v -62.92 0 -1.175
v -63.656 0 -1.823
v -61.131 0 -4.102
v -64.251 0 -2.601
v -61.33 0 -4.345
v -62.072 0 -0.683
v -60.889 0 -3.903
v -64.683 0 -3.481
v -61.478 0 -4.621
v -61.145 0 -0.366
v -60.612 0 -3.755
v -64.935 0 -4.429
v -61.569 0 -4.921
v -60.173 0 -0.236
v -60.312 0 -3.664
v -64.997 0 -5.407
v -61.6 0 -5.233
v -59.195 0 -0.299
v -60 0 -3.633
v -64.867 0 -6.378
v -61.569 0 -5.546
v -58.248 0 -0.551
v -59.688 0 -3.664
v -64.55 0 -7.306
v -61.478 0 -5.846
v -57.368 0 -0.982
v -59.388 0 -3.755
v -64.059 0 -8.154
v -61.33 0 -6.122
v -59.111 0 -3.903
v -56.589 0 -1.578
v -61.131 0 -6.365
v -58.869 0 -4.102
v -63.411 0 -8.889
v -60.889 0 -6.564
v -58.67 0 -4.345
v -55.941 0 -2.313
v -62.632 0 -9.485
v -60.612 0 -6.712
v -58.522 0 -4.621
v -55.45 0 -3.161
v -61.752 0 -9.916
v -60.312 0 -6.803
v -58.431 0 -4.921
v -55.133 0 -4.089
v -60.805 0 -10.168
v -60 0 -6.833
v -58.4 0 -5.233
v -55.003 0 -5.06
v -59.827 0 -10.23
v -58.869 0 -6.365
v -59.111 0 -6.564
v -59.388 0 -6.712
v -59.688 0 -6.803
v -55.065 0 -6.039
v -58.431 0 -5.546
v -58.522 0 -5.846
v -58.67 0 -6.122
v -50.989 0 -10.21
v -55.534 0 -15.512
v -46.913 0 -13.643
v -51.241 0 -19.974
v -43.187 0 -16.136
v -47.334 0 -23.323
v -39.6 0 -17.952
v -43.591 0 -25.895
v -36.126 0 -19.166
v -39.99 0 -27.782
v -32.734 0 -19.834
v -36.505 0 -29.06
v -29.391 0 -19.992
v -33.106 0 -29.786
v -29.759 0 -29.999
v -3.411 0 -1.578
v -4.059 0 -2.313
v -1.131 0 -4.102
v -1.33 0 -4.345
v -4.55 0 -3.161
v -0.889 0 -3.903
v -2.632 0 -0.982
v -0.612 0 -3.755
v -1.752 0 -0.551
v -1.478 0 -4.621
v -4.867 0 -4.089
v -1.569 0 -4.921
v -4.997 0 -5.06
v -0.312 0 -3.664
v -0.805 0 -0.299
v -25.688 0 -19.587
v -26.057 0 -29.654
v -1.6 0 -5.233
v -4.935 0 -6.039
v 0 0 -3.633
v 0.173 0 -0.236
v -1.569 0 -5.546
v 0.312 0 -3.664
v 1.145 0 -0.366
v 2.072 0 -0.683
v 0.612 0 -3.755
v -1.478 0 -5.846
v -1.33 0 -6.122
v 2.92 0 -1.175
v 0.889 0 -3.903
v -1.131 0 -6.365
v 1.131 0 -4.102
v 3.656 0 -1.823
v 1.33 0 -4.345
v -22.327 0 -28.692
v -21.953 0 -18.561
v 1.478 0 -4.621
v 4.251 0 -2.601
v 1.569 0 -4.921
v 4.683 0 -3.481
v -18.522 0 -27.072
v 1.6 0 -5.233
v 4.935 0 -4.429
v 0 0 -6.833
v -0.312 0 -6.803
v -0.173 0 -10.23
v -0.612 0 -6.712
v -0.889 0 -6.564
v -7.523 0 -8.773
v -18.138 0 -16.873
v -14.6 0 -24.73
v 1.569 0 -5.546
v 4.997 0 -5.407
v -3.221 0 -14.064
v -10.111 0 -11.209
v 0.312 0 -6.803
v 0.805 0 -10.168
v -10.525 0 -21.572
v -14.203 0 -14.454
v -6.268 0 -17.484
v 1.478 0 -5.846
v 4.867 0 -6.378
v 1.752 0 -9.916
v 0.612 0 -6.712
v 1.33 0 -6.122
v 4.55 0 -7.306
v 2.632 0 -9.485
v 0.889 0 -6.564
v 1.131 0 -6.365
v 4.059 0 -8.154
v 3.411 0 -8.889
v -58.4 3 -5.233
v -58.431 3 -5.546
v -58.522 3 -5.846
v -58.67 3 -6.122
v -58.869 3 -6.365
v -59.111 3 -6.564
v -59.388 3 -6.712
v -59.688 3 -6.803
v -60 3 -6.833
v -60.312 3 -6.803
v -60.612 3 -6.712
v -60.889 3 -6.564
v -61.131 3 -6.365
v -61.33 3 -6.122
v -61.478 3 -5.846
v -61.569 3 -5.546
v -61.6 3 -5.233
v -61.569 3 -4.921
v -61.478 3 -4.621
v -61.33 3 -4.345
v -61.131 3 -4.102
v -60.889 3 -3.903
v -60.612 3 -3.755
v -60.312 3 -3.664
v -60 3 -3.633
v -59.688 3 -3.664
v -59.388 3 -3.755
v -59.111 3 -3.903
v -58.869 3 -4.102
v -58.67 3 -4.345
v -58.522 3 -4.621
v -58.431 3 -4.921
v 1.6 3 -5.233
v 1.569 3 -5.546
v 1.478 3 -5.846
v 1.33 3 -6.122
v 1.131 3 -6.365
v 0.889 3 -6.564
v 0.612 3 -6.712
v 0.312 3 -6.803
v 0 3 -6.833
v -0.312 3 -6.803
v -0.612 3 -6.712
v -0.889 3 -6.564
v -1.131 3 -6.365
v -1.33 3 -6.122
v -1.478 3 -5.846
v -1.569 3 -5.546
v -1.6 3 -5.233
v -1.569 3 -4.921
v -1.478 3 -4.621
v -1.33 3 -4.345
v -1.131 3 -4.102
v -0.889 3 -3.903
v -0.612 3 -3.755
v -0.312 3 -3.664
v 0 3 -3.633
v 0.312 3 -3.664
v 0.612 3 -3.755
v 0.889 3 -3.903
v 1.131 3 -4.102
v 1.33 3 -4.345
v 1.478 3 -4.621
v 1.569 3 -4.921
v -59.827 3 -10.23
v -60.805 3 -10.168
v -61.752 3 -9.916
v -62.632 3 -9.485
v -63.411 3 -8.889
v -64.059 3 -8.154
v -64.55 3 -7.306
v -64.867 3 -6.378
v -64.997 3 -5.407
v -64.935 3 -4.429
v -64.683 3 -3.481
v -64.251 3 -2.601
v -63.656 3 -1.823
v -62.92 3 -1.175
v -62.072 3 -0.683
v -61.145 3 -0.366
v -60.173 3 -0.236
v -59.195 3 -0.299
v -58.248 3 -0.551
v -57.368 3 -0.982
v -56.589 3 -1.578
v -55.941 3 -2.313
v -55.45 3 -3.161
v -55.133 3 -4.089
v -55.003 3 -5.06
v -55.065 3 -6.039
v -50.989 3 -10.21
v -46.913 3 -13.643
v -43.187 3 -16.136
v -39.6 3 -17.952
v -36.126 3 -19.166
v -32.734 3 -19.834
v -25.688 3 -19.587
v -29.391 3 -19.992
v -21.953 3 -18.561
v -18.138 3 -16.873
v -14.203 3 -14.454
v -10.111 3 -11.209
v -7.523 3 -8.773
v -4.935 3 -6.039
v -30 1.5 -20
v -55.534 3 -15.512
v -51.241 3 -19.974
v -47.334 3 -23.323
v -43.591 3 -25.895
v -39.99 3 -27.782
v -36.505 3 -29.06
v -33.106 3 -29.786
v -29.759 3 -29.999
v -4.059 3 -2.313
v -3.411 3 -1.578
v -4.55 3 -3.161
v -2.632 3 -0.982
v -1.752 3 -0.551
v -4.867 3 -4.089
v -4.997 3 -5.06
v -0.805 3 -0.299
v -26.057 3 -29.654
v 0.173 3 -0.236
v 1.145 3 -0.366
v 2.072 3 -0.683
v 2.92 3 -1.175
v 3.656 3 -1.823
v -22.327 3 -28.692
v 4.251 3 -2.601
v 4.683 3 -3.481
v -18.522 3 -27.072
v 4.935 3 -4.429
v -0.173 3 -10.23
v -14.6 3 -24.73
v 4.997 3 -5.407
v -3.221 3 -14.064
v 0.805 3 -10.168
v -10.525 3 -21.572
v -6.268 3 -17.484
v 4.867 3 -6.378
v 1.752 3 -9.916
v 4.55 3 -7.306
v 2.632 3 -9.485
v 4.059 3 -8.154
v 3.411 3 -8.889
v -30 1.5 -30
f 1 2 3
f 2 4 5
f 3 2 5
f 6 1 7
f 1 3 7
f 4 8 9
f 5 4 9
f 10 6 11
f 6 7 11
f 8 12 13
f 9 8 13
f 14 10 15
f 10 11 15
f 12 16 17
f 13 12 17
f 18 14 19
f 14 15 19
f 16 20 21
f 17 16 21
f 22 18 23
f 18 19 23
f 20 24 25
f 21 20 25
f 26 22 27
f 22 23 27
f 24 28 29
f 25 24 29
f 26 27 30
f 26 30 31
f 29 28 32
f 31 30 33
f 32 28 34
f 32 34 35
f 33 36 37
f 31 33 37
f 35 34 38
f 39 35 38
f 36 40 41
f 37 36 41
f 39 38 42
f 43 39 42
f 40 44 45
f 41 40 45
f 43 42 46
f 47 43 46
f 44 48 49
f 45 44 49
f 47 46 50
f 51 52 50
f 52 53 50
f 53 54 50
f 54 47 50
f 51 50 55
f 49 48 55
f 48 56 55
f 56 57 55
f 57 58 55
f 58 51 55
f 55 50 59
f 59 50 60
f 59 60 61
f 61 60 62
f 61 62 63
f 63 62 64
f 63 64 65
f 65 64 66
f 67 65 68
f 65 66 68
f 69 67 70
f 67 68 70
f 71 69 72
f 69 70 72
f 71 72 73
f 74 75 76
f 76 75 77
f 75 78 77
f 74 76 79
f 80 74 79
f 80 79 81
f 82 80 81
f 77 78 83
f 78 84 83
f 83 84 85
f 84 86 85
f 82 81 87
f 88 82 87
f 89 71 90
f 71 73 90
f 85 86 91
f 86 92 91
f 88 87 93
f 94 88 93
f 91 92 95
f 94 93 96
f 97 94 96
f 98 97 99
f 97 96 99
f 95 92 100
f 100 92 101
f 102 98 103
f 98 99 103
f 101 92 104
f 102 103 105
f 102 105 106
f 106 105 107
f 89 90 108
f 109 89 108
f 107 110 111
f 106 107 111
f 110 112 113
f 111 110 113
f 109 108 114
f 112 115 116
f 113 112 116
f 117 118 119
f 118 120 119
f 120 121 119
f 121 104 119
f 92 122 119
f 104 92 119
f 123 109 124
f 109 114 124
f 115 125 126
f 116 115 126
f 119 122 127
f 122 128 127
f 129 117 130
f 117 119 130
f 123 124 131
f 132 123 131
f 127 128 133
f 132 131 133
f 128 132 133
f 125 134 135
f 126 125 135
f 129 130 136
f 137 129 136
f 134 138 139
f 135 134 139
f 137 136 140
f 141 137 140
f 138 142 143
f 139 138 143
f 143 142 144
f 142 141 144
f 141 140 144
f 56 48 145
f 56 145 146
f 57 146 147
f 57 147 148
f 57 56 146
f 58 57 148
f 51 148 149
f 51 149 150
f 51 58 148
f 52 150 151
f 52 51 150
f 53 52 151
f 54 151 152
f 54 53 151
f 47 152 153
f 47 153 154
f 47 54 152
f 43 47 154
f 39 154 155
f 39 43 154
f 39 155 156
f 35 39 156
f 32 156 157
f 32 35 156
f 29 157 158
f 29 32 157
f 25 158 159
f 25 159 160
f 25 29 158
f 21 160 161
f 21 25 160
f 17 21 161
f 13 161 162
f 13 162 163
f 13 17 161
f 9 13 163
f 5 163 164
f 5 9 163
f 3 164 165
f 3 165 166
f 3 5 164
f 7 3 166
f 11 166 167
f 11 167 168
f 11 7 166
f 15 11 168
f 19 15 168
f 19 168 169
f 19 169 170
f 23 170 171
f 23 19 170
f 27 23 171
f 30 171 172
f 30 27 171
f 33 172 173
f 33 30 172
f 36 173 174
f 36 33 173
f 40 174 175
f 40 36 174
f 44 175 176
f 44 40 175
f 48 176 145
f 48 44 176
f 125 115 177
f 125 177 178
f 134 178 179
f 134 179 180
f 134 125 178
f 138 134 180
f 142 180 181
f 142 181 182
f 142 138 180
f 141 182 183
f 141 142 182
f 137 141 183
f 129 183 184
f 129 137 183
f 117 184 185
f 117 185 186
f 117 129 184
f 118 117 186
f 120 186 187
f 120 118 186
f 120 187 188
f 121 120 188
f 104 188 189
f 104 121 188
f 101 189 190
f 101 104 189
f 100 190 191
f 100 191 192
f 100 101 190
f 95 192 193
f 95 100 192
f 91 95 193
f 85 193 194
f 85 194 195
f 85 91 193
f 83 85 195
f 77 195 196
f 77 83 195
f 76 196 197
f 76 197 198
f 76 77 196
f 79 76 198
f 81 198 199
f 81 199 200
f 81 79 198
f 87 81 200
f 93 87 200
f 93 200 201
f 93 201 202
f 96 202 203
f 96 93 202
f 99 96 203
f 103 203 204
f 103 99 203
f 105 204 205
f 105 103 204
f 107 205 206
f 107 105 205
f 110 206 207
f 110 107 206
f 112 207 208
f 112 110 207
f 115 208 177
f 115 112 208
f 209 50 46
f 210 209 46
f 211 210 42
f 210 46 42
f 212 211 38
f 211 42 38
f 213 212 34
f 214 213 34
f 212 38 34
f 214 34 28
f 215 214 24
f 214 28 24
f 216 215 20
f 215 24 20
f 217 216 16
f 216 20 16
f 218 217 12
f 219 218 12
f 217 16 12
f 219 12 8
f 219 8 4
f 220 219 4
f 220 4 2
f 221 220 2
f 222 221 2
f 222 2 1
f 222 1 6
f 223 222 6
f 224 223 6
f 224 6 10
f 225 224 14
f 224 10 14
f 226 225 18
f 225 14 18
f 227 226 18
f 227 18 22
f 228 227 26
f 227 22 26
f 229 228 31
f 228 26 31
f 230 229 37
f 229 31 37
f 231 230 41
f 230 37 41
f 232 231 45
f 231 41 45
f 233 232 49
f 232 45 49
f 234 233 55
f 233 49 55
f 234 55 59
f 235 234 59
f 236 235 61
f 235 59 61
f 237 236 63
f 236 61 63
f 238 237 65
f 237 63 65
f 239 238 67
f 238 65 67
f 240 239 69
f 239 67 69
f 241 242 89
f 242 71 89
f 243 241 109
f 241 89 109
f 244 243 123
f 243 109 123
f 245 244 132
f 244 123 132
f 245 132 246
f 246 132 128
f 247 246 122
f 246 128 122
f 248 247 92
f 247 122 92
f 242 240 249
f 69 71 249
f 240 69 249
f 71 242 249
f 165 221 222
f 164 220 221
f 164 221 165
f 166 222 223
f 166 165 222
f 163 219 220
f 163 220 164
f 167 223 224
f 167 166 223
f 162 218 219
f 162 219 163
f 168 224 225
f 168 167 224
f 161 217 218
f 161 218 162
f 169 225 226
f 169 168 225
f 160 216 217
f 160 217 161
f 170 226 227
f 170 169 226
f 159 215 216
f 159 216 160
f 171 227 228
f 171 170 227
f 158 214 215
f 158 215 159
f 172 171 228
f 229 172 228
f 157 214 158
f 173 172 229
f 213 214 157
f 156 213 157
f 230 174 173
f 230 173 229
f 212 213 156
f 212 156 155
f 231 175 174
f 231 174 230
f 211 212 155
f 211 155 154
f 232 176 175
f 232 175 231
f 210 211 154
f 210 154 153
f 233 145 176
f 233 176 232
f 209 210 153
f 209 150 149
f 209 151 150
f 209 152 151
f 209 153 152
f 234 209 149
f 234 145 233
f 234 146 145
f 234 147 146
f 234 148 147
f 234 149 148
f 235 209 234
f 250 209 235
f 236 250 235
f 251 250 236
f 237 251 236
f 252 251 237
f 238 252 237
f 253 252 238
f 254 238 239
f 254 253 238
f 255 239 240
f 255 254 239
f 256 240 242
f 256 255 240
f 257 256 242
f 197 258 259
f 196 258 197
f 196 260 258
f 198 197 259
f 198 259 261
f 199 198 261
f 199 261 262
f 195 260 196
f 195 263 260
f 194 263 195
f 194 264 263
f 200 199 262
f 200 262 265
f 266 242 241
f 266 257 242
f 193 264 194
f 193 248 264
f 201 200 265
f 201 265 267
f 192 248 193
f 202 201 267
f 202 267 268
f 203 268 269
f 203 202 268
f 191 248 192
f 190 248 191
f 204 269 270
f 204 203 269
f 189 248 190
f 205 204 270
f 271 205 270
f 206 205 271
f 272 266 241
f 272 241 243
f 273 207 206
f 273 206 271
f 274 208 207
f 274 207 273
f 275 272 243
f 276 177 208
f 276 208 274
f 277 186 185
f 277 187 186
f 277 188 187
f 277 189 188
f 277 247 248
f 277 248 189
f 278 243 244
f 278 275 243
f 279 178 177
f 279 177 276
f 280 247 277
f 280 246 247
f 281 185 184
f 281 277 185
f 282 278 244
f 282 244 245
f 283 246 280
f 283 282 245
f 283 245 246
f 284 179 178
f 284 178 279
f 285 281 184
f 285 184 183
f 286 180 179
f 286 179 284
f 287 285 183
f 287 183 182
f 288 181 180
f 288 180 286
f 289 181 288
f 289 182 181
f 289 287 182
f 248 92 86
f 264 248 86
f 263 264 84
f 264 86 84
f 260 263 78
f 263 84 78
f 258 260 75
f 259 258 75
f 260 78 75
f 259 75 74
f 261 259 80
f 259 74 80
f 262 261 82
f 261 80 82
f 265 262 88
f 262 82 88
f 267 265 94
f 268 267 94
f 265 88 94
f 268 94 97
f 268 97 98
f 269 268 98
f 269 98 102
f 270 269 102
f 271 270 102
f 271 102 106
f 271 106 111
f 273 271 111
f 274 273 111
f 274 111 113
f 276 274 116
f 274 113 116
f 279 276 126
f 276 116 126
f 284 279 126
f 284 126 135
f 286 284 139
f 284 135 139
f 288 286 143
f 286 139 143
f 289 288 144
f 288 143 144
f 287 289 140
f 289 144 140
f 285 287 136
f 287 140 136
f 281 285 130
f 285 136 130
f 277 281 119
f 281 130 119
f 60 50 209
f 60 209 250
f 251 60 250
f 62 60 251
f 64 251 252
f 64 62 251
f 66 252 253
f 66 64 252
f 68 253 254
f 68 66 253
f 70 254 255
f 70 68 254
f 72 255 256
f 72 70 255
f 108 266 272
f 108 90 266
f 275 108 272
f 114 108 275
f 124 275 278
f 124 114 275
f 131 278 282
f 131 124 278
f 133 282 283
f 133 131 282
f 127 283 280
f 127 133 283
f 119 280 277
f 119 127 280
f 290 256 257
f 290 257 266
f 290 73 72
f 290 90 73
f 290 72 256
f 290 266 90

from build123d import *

# Parameters (mm, degrees)
SKETCH1_R           = 1.6
BOSS_EXTRUDE1_DEPTH = 3


with BuildPart() as part:
    # Sketch1 → Boss-Extrude1 (new body)
    with BuildSketch(Plane(origin=(0, 0, 0), x_dir=(1, 0, 0), z_dir=(0, 1, 0))):
        with BuildLine():
            ThreePointArc((-59.826654002, 10.230460246), (-63.30397667, 1.480635346), (-55.065238323, 6.038529506))
            add(Edge.make_bspline(
                [(-55.065238323, 6.038529506), (-46.710158882, 15.346176502), (-30, 24.653823498), (-13.289841118, 15.346176502), (-4.934761677, 6.038529506)],
                knots=[0.082246028, 0.082246028, 0.082246028, 0.082246028, 0.5, 0.917753972, 0.917753972, 0.917753972, 0.917753972], degree=3))
            ThreePointArc((-4.934761677, 6.038529506), (3.30397667, 1.480635346), (-0.173345998, 10.230460246))
            add(Edge.make_bspline(
                [(-59.826654002, 10.230460246), (-49.884436001, 23.410153415), (-30, 36.589846585), (-10.115563999, 23.410153415), (-0.173345998, 10.230460246)],
                knots=[0.0028891, 0.0028891, 0.0028891, 0.0028891, 0.5, 0.9971109, 0.9971109, 0.9971109, 0.9971109], degree=3))
        make_face()
        with Locations((-60, 5.233466033)):
            Circle(SKETCH1_R, mode=Mode.SUBTRACT)
        with Locations((0, 5.233466033)):
            Circle(SKETCH1_R, mode=Mode.SUBTRACT)
    extrude(amount=BOSS_EXTRUDE1_DEPTH)


solid = part.part
